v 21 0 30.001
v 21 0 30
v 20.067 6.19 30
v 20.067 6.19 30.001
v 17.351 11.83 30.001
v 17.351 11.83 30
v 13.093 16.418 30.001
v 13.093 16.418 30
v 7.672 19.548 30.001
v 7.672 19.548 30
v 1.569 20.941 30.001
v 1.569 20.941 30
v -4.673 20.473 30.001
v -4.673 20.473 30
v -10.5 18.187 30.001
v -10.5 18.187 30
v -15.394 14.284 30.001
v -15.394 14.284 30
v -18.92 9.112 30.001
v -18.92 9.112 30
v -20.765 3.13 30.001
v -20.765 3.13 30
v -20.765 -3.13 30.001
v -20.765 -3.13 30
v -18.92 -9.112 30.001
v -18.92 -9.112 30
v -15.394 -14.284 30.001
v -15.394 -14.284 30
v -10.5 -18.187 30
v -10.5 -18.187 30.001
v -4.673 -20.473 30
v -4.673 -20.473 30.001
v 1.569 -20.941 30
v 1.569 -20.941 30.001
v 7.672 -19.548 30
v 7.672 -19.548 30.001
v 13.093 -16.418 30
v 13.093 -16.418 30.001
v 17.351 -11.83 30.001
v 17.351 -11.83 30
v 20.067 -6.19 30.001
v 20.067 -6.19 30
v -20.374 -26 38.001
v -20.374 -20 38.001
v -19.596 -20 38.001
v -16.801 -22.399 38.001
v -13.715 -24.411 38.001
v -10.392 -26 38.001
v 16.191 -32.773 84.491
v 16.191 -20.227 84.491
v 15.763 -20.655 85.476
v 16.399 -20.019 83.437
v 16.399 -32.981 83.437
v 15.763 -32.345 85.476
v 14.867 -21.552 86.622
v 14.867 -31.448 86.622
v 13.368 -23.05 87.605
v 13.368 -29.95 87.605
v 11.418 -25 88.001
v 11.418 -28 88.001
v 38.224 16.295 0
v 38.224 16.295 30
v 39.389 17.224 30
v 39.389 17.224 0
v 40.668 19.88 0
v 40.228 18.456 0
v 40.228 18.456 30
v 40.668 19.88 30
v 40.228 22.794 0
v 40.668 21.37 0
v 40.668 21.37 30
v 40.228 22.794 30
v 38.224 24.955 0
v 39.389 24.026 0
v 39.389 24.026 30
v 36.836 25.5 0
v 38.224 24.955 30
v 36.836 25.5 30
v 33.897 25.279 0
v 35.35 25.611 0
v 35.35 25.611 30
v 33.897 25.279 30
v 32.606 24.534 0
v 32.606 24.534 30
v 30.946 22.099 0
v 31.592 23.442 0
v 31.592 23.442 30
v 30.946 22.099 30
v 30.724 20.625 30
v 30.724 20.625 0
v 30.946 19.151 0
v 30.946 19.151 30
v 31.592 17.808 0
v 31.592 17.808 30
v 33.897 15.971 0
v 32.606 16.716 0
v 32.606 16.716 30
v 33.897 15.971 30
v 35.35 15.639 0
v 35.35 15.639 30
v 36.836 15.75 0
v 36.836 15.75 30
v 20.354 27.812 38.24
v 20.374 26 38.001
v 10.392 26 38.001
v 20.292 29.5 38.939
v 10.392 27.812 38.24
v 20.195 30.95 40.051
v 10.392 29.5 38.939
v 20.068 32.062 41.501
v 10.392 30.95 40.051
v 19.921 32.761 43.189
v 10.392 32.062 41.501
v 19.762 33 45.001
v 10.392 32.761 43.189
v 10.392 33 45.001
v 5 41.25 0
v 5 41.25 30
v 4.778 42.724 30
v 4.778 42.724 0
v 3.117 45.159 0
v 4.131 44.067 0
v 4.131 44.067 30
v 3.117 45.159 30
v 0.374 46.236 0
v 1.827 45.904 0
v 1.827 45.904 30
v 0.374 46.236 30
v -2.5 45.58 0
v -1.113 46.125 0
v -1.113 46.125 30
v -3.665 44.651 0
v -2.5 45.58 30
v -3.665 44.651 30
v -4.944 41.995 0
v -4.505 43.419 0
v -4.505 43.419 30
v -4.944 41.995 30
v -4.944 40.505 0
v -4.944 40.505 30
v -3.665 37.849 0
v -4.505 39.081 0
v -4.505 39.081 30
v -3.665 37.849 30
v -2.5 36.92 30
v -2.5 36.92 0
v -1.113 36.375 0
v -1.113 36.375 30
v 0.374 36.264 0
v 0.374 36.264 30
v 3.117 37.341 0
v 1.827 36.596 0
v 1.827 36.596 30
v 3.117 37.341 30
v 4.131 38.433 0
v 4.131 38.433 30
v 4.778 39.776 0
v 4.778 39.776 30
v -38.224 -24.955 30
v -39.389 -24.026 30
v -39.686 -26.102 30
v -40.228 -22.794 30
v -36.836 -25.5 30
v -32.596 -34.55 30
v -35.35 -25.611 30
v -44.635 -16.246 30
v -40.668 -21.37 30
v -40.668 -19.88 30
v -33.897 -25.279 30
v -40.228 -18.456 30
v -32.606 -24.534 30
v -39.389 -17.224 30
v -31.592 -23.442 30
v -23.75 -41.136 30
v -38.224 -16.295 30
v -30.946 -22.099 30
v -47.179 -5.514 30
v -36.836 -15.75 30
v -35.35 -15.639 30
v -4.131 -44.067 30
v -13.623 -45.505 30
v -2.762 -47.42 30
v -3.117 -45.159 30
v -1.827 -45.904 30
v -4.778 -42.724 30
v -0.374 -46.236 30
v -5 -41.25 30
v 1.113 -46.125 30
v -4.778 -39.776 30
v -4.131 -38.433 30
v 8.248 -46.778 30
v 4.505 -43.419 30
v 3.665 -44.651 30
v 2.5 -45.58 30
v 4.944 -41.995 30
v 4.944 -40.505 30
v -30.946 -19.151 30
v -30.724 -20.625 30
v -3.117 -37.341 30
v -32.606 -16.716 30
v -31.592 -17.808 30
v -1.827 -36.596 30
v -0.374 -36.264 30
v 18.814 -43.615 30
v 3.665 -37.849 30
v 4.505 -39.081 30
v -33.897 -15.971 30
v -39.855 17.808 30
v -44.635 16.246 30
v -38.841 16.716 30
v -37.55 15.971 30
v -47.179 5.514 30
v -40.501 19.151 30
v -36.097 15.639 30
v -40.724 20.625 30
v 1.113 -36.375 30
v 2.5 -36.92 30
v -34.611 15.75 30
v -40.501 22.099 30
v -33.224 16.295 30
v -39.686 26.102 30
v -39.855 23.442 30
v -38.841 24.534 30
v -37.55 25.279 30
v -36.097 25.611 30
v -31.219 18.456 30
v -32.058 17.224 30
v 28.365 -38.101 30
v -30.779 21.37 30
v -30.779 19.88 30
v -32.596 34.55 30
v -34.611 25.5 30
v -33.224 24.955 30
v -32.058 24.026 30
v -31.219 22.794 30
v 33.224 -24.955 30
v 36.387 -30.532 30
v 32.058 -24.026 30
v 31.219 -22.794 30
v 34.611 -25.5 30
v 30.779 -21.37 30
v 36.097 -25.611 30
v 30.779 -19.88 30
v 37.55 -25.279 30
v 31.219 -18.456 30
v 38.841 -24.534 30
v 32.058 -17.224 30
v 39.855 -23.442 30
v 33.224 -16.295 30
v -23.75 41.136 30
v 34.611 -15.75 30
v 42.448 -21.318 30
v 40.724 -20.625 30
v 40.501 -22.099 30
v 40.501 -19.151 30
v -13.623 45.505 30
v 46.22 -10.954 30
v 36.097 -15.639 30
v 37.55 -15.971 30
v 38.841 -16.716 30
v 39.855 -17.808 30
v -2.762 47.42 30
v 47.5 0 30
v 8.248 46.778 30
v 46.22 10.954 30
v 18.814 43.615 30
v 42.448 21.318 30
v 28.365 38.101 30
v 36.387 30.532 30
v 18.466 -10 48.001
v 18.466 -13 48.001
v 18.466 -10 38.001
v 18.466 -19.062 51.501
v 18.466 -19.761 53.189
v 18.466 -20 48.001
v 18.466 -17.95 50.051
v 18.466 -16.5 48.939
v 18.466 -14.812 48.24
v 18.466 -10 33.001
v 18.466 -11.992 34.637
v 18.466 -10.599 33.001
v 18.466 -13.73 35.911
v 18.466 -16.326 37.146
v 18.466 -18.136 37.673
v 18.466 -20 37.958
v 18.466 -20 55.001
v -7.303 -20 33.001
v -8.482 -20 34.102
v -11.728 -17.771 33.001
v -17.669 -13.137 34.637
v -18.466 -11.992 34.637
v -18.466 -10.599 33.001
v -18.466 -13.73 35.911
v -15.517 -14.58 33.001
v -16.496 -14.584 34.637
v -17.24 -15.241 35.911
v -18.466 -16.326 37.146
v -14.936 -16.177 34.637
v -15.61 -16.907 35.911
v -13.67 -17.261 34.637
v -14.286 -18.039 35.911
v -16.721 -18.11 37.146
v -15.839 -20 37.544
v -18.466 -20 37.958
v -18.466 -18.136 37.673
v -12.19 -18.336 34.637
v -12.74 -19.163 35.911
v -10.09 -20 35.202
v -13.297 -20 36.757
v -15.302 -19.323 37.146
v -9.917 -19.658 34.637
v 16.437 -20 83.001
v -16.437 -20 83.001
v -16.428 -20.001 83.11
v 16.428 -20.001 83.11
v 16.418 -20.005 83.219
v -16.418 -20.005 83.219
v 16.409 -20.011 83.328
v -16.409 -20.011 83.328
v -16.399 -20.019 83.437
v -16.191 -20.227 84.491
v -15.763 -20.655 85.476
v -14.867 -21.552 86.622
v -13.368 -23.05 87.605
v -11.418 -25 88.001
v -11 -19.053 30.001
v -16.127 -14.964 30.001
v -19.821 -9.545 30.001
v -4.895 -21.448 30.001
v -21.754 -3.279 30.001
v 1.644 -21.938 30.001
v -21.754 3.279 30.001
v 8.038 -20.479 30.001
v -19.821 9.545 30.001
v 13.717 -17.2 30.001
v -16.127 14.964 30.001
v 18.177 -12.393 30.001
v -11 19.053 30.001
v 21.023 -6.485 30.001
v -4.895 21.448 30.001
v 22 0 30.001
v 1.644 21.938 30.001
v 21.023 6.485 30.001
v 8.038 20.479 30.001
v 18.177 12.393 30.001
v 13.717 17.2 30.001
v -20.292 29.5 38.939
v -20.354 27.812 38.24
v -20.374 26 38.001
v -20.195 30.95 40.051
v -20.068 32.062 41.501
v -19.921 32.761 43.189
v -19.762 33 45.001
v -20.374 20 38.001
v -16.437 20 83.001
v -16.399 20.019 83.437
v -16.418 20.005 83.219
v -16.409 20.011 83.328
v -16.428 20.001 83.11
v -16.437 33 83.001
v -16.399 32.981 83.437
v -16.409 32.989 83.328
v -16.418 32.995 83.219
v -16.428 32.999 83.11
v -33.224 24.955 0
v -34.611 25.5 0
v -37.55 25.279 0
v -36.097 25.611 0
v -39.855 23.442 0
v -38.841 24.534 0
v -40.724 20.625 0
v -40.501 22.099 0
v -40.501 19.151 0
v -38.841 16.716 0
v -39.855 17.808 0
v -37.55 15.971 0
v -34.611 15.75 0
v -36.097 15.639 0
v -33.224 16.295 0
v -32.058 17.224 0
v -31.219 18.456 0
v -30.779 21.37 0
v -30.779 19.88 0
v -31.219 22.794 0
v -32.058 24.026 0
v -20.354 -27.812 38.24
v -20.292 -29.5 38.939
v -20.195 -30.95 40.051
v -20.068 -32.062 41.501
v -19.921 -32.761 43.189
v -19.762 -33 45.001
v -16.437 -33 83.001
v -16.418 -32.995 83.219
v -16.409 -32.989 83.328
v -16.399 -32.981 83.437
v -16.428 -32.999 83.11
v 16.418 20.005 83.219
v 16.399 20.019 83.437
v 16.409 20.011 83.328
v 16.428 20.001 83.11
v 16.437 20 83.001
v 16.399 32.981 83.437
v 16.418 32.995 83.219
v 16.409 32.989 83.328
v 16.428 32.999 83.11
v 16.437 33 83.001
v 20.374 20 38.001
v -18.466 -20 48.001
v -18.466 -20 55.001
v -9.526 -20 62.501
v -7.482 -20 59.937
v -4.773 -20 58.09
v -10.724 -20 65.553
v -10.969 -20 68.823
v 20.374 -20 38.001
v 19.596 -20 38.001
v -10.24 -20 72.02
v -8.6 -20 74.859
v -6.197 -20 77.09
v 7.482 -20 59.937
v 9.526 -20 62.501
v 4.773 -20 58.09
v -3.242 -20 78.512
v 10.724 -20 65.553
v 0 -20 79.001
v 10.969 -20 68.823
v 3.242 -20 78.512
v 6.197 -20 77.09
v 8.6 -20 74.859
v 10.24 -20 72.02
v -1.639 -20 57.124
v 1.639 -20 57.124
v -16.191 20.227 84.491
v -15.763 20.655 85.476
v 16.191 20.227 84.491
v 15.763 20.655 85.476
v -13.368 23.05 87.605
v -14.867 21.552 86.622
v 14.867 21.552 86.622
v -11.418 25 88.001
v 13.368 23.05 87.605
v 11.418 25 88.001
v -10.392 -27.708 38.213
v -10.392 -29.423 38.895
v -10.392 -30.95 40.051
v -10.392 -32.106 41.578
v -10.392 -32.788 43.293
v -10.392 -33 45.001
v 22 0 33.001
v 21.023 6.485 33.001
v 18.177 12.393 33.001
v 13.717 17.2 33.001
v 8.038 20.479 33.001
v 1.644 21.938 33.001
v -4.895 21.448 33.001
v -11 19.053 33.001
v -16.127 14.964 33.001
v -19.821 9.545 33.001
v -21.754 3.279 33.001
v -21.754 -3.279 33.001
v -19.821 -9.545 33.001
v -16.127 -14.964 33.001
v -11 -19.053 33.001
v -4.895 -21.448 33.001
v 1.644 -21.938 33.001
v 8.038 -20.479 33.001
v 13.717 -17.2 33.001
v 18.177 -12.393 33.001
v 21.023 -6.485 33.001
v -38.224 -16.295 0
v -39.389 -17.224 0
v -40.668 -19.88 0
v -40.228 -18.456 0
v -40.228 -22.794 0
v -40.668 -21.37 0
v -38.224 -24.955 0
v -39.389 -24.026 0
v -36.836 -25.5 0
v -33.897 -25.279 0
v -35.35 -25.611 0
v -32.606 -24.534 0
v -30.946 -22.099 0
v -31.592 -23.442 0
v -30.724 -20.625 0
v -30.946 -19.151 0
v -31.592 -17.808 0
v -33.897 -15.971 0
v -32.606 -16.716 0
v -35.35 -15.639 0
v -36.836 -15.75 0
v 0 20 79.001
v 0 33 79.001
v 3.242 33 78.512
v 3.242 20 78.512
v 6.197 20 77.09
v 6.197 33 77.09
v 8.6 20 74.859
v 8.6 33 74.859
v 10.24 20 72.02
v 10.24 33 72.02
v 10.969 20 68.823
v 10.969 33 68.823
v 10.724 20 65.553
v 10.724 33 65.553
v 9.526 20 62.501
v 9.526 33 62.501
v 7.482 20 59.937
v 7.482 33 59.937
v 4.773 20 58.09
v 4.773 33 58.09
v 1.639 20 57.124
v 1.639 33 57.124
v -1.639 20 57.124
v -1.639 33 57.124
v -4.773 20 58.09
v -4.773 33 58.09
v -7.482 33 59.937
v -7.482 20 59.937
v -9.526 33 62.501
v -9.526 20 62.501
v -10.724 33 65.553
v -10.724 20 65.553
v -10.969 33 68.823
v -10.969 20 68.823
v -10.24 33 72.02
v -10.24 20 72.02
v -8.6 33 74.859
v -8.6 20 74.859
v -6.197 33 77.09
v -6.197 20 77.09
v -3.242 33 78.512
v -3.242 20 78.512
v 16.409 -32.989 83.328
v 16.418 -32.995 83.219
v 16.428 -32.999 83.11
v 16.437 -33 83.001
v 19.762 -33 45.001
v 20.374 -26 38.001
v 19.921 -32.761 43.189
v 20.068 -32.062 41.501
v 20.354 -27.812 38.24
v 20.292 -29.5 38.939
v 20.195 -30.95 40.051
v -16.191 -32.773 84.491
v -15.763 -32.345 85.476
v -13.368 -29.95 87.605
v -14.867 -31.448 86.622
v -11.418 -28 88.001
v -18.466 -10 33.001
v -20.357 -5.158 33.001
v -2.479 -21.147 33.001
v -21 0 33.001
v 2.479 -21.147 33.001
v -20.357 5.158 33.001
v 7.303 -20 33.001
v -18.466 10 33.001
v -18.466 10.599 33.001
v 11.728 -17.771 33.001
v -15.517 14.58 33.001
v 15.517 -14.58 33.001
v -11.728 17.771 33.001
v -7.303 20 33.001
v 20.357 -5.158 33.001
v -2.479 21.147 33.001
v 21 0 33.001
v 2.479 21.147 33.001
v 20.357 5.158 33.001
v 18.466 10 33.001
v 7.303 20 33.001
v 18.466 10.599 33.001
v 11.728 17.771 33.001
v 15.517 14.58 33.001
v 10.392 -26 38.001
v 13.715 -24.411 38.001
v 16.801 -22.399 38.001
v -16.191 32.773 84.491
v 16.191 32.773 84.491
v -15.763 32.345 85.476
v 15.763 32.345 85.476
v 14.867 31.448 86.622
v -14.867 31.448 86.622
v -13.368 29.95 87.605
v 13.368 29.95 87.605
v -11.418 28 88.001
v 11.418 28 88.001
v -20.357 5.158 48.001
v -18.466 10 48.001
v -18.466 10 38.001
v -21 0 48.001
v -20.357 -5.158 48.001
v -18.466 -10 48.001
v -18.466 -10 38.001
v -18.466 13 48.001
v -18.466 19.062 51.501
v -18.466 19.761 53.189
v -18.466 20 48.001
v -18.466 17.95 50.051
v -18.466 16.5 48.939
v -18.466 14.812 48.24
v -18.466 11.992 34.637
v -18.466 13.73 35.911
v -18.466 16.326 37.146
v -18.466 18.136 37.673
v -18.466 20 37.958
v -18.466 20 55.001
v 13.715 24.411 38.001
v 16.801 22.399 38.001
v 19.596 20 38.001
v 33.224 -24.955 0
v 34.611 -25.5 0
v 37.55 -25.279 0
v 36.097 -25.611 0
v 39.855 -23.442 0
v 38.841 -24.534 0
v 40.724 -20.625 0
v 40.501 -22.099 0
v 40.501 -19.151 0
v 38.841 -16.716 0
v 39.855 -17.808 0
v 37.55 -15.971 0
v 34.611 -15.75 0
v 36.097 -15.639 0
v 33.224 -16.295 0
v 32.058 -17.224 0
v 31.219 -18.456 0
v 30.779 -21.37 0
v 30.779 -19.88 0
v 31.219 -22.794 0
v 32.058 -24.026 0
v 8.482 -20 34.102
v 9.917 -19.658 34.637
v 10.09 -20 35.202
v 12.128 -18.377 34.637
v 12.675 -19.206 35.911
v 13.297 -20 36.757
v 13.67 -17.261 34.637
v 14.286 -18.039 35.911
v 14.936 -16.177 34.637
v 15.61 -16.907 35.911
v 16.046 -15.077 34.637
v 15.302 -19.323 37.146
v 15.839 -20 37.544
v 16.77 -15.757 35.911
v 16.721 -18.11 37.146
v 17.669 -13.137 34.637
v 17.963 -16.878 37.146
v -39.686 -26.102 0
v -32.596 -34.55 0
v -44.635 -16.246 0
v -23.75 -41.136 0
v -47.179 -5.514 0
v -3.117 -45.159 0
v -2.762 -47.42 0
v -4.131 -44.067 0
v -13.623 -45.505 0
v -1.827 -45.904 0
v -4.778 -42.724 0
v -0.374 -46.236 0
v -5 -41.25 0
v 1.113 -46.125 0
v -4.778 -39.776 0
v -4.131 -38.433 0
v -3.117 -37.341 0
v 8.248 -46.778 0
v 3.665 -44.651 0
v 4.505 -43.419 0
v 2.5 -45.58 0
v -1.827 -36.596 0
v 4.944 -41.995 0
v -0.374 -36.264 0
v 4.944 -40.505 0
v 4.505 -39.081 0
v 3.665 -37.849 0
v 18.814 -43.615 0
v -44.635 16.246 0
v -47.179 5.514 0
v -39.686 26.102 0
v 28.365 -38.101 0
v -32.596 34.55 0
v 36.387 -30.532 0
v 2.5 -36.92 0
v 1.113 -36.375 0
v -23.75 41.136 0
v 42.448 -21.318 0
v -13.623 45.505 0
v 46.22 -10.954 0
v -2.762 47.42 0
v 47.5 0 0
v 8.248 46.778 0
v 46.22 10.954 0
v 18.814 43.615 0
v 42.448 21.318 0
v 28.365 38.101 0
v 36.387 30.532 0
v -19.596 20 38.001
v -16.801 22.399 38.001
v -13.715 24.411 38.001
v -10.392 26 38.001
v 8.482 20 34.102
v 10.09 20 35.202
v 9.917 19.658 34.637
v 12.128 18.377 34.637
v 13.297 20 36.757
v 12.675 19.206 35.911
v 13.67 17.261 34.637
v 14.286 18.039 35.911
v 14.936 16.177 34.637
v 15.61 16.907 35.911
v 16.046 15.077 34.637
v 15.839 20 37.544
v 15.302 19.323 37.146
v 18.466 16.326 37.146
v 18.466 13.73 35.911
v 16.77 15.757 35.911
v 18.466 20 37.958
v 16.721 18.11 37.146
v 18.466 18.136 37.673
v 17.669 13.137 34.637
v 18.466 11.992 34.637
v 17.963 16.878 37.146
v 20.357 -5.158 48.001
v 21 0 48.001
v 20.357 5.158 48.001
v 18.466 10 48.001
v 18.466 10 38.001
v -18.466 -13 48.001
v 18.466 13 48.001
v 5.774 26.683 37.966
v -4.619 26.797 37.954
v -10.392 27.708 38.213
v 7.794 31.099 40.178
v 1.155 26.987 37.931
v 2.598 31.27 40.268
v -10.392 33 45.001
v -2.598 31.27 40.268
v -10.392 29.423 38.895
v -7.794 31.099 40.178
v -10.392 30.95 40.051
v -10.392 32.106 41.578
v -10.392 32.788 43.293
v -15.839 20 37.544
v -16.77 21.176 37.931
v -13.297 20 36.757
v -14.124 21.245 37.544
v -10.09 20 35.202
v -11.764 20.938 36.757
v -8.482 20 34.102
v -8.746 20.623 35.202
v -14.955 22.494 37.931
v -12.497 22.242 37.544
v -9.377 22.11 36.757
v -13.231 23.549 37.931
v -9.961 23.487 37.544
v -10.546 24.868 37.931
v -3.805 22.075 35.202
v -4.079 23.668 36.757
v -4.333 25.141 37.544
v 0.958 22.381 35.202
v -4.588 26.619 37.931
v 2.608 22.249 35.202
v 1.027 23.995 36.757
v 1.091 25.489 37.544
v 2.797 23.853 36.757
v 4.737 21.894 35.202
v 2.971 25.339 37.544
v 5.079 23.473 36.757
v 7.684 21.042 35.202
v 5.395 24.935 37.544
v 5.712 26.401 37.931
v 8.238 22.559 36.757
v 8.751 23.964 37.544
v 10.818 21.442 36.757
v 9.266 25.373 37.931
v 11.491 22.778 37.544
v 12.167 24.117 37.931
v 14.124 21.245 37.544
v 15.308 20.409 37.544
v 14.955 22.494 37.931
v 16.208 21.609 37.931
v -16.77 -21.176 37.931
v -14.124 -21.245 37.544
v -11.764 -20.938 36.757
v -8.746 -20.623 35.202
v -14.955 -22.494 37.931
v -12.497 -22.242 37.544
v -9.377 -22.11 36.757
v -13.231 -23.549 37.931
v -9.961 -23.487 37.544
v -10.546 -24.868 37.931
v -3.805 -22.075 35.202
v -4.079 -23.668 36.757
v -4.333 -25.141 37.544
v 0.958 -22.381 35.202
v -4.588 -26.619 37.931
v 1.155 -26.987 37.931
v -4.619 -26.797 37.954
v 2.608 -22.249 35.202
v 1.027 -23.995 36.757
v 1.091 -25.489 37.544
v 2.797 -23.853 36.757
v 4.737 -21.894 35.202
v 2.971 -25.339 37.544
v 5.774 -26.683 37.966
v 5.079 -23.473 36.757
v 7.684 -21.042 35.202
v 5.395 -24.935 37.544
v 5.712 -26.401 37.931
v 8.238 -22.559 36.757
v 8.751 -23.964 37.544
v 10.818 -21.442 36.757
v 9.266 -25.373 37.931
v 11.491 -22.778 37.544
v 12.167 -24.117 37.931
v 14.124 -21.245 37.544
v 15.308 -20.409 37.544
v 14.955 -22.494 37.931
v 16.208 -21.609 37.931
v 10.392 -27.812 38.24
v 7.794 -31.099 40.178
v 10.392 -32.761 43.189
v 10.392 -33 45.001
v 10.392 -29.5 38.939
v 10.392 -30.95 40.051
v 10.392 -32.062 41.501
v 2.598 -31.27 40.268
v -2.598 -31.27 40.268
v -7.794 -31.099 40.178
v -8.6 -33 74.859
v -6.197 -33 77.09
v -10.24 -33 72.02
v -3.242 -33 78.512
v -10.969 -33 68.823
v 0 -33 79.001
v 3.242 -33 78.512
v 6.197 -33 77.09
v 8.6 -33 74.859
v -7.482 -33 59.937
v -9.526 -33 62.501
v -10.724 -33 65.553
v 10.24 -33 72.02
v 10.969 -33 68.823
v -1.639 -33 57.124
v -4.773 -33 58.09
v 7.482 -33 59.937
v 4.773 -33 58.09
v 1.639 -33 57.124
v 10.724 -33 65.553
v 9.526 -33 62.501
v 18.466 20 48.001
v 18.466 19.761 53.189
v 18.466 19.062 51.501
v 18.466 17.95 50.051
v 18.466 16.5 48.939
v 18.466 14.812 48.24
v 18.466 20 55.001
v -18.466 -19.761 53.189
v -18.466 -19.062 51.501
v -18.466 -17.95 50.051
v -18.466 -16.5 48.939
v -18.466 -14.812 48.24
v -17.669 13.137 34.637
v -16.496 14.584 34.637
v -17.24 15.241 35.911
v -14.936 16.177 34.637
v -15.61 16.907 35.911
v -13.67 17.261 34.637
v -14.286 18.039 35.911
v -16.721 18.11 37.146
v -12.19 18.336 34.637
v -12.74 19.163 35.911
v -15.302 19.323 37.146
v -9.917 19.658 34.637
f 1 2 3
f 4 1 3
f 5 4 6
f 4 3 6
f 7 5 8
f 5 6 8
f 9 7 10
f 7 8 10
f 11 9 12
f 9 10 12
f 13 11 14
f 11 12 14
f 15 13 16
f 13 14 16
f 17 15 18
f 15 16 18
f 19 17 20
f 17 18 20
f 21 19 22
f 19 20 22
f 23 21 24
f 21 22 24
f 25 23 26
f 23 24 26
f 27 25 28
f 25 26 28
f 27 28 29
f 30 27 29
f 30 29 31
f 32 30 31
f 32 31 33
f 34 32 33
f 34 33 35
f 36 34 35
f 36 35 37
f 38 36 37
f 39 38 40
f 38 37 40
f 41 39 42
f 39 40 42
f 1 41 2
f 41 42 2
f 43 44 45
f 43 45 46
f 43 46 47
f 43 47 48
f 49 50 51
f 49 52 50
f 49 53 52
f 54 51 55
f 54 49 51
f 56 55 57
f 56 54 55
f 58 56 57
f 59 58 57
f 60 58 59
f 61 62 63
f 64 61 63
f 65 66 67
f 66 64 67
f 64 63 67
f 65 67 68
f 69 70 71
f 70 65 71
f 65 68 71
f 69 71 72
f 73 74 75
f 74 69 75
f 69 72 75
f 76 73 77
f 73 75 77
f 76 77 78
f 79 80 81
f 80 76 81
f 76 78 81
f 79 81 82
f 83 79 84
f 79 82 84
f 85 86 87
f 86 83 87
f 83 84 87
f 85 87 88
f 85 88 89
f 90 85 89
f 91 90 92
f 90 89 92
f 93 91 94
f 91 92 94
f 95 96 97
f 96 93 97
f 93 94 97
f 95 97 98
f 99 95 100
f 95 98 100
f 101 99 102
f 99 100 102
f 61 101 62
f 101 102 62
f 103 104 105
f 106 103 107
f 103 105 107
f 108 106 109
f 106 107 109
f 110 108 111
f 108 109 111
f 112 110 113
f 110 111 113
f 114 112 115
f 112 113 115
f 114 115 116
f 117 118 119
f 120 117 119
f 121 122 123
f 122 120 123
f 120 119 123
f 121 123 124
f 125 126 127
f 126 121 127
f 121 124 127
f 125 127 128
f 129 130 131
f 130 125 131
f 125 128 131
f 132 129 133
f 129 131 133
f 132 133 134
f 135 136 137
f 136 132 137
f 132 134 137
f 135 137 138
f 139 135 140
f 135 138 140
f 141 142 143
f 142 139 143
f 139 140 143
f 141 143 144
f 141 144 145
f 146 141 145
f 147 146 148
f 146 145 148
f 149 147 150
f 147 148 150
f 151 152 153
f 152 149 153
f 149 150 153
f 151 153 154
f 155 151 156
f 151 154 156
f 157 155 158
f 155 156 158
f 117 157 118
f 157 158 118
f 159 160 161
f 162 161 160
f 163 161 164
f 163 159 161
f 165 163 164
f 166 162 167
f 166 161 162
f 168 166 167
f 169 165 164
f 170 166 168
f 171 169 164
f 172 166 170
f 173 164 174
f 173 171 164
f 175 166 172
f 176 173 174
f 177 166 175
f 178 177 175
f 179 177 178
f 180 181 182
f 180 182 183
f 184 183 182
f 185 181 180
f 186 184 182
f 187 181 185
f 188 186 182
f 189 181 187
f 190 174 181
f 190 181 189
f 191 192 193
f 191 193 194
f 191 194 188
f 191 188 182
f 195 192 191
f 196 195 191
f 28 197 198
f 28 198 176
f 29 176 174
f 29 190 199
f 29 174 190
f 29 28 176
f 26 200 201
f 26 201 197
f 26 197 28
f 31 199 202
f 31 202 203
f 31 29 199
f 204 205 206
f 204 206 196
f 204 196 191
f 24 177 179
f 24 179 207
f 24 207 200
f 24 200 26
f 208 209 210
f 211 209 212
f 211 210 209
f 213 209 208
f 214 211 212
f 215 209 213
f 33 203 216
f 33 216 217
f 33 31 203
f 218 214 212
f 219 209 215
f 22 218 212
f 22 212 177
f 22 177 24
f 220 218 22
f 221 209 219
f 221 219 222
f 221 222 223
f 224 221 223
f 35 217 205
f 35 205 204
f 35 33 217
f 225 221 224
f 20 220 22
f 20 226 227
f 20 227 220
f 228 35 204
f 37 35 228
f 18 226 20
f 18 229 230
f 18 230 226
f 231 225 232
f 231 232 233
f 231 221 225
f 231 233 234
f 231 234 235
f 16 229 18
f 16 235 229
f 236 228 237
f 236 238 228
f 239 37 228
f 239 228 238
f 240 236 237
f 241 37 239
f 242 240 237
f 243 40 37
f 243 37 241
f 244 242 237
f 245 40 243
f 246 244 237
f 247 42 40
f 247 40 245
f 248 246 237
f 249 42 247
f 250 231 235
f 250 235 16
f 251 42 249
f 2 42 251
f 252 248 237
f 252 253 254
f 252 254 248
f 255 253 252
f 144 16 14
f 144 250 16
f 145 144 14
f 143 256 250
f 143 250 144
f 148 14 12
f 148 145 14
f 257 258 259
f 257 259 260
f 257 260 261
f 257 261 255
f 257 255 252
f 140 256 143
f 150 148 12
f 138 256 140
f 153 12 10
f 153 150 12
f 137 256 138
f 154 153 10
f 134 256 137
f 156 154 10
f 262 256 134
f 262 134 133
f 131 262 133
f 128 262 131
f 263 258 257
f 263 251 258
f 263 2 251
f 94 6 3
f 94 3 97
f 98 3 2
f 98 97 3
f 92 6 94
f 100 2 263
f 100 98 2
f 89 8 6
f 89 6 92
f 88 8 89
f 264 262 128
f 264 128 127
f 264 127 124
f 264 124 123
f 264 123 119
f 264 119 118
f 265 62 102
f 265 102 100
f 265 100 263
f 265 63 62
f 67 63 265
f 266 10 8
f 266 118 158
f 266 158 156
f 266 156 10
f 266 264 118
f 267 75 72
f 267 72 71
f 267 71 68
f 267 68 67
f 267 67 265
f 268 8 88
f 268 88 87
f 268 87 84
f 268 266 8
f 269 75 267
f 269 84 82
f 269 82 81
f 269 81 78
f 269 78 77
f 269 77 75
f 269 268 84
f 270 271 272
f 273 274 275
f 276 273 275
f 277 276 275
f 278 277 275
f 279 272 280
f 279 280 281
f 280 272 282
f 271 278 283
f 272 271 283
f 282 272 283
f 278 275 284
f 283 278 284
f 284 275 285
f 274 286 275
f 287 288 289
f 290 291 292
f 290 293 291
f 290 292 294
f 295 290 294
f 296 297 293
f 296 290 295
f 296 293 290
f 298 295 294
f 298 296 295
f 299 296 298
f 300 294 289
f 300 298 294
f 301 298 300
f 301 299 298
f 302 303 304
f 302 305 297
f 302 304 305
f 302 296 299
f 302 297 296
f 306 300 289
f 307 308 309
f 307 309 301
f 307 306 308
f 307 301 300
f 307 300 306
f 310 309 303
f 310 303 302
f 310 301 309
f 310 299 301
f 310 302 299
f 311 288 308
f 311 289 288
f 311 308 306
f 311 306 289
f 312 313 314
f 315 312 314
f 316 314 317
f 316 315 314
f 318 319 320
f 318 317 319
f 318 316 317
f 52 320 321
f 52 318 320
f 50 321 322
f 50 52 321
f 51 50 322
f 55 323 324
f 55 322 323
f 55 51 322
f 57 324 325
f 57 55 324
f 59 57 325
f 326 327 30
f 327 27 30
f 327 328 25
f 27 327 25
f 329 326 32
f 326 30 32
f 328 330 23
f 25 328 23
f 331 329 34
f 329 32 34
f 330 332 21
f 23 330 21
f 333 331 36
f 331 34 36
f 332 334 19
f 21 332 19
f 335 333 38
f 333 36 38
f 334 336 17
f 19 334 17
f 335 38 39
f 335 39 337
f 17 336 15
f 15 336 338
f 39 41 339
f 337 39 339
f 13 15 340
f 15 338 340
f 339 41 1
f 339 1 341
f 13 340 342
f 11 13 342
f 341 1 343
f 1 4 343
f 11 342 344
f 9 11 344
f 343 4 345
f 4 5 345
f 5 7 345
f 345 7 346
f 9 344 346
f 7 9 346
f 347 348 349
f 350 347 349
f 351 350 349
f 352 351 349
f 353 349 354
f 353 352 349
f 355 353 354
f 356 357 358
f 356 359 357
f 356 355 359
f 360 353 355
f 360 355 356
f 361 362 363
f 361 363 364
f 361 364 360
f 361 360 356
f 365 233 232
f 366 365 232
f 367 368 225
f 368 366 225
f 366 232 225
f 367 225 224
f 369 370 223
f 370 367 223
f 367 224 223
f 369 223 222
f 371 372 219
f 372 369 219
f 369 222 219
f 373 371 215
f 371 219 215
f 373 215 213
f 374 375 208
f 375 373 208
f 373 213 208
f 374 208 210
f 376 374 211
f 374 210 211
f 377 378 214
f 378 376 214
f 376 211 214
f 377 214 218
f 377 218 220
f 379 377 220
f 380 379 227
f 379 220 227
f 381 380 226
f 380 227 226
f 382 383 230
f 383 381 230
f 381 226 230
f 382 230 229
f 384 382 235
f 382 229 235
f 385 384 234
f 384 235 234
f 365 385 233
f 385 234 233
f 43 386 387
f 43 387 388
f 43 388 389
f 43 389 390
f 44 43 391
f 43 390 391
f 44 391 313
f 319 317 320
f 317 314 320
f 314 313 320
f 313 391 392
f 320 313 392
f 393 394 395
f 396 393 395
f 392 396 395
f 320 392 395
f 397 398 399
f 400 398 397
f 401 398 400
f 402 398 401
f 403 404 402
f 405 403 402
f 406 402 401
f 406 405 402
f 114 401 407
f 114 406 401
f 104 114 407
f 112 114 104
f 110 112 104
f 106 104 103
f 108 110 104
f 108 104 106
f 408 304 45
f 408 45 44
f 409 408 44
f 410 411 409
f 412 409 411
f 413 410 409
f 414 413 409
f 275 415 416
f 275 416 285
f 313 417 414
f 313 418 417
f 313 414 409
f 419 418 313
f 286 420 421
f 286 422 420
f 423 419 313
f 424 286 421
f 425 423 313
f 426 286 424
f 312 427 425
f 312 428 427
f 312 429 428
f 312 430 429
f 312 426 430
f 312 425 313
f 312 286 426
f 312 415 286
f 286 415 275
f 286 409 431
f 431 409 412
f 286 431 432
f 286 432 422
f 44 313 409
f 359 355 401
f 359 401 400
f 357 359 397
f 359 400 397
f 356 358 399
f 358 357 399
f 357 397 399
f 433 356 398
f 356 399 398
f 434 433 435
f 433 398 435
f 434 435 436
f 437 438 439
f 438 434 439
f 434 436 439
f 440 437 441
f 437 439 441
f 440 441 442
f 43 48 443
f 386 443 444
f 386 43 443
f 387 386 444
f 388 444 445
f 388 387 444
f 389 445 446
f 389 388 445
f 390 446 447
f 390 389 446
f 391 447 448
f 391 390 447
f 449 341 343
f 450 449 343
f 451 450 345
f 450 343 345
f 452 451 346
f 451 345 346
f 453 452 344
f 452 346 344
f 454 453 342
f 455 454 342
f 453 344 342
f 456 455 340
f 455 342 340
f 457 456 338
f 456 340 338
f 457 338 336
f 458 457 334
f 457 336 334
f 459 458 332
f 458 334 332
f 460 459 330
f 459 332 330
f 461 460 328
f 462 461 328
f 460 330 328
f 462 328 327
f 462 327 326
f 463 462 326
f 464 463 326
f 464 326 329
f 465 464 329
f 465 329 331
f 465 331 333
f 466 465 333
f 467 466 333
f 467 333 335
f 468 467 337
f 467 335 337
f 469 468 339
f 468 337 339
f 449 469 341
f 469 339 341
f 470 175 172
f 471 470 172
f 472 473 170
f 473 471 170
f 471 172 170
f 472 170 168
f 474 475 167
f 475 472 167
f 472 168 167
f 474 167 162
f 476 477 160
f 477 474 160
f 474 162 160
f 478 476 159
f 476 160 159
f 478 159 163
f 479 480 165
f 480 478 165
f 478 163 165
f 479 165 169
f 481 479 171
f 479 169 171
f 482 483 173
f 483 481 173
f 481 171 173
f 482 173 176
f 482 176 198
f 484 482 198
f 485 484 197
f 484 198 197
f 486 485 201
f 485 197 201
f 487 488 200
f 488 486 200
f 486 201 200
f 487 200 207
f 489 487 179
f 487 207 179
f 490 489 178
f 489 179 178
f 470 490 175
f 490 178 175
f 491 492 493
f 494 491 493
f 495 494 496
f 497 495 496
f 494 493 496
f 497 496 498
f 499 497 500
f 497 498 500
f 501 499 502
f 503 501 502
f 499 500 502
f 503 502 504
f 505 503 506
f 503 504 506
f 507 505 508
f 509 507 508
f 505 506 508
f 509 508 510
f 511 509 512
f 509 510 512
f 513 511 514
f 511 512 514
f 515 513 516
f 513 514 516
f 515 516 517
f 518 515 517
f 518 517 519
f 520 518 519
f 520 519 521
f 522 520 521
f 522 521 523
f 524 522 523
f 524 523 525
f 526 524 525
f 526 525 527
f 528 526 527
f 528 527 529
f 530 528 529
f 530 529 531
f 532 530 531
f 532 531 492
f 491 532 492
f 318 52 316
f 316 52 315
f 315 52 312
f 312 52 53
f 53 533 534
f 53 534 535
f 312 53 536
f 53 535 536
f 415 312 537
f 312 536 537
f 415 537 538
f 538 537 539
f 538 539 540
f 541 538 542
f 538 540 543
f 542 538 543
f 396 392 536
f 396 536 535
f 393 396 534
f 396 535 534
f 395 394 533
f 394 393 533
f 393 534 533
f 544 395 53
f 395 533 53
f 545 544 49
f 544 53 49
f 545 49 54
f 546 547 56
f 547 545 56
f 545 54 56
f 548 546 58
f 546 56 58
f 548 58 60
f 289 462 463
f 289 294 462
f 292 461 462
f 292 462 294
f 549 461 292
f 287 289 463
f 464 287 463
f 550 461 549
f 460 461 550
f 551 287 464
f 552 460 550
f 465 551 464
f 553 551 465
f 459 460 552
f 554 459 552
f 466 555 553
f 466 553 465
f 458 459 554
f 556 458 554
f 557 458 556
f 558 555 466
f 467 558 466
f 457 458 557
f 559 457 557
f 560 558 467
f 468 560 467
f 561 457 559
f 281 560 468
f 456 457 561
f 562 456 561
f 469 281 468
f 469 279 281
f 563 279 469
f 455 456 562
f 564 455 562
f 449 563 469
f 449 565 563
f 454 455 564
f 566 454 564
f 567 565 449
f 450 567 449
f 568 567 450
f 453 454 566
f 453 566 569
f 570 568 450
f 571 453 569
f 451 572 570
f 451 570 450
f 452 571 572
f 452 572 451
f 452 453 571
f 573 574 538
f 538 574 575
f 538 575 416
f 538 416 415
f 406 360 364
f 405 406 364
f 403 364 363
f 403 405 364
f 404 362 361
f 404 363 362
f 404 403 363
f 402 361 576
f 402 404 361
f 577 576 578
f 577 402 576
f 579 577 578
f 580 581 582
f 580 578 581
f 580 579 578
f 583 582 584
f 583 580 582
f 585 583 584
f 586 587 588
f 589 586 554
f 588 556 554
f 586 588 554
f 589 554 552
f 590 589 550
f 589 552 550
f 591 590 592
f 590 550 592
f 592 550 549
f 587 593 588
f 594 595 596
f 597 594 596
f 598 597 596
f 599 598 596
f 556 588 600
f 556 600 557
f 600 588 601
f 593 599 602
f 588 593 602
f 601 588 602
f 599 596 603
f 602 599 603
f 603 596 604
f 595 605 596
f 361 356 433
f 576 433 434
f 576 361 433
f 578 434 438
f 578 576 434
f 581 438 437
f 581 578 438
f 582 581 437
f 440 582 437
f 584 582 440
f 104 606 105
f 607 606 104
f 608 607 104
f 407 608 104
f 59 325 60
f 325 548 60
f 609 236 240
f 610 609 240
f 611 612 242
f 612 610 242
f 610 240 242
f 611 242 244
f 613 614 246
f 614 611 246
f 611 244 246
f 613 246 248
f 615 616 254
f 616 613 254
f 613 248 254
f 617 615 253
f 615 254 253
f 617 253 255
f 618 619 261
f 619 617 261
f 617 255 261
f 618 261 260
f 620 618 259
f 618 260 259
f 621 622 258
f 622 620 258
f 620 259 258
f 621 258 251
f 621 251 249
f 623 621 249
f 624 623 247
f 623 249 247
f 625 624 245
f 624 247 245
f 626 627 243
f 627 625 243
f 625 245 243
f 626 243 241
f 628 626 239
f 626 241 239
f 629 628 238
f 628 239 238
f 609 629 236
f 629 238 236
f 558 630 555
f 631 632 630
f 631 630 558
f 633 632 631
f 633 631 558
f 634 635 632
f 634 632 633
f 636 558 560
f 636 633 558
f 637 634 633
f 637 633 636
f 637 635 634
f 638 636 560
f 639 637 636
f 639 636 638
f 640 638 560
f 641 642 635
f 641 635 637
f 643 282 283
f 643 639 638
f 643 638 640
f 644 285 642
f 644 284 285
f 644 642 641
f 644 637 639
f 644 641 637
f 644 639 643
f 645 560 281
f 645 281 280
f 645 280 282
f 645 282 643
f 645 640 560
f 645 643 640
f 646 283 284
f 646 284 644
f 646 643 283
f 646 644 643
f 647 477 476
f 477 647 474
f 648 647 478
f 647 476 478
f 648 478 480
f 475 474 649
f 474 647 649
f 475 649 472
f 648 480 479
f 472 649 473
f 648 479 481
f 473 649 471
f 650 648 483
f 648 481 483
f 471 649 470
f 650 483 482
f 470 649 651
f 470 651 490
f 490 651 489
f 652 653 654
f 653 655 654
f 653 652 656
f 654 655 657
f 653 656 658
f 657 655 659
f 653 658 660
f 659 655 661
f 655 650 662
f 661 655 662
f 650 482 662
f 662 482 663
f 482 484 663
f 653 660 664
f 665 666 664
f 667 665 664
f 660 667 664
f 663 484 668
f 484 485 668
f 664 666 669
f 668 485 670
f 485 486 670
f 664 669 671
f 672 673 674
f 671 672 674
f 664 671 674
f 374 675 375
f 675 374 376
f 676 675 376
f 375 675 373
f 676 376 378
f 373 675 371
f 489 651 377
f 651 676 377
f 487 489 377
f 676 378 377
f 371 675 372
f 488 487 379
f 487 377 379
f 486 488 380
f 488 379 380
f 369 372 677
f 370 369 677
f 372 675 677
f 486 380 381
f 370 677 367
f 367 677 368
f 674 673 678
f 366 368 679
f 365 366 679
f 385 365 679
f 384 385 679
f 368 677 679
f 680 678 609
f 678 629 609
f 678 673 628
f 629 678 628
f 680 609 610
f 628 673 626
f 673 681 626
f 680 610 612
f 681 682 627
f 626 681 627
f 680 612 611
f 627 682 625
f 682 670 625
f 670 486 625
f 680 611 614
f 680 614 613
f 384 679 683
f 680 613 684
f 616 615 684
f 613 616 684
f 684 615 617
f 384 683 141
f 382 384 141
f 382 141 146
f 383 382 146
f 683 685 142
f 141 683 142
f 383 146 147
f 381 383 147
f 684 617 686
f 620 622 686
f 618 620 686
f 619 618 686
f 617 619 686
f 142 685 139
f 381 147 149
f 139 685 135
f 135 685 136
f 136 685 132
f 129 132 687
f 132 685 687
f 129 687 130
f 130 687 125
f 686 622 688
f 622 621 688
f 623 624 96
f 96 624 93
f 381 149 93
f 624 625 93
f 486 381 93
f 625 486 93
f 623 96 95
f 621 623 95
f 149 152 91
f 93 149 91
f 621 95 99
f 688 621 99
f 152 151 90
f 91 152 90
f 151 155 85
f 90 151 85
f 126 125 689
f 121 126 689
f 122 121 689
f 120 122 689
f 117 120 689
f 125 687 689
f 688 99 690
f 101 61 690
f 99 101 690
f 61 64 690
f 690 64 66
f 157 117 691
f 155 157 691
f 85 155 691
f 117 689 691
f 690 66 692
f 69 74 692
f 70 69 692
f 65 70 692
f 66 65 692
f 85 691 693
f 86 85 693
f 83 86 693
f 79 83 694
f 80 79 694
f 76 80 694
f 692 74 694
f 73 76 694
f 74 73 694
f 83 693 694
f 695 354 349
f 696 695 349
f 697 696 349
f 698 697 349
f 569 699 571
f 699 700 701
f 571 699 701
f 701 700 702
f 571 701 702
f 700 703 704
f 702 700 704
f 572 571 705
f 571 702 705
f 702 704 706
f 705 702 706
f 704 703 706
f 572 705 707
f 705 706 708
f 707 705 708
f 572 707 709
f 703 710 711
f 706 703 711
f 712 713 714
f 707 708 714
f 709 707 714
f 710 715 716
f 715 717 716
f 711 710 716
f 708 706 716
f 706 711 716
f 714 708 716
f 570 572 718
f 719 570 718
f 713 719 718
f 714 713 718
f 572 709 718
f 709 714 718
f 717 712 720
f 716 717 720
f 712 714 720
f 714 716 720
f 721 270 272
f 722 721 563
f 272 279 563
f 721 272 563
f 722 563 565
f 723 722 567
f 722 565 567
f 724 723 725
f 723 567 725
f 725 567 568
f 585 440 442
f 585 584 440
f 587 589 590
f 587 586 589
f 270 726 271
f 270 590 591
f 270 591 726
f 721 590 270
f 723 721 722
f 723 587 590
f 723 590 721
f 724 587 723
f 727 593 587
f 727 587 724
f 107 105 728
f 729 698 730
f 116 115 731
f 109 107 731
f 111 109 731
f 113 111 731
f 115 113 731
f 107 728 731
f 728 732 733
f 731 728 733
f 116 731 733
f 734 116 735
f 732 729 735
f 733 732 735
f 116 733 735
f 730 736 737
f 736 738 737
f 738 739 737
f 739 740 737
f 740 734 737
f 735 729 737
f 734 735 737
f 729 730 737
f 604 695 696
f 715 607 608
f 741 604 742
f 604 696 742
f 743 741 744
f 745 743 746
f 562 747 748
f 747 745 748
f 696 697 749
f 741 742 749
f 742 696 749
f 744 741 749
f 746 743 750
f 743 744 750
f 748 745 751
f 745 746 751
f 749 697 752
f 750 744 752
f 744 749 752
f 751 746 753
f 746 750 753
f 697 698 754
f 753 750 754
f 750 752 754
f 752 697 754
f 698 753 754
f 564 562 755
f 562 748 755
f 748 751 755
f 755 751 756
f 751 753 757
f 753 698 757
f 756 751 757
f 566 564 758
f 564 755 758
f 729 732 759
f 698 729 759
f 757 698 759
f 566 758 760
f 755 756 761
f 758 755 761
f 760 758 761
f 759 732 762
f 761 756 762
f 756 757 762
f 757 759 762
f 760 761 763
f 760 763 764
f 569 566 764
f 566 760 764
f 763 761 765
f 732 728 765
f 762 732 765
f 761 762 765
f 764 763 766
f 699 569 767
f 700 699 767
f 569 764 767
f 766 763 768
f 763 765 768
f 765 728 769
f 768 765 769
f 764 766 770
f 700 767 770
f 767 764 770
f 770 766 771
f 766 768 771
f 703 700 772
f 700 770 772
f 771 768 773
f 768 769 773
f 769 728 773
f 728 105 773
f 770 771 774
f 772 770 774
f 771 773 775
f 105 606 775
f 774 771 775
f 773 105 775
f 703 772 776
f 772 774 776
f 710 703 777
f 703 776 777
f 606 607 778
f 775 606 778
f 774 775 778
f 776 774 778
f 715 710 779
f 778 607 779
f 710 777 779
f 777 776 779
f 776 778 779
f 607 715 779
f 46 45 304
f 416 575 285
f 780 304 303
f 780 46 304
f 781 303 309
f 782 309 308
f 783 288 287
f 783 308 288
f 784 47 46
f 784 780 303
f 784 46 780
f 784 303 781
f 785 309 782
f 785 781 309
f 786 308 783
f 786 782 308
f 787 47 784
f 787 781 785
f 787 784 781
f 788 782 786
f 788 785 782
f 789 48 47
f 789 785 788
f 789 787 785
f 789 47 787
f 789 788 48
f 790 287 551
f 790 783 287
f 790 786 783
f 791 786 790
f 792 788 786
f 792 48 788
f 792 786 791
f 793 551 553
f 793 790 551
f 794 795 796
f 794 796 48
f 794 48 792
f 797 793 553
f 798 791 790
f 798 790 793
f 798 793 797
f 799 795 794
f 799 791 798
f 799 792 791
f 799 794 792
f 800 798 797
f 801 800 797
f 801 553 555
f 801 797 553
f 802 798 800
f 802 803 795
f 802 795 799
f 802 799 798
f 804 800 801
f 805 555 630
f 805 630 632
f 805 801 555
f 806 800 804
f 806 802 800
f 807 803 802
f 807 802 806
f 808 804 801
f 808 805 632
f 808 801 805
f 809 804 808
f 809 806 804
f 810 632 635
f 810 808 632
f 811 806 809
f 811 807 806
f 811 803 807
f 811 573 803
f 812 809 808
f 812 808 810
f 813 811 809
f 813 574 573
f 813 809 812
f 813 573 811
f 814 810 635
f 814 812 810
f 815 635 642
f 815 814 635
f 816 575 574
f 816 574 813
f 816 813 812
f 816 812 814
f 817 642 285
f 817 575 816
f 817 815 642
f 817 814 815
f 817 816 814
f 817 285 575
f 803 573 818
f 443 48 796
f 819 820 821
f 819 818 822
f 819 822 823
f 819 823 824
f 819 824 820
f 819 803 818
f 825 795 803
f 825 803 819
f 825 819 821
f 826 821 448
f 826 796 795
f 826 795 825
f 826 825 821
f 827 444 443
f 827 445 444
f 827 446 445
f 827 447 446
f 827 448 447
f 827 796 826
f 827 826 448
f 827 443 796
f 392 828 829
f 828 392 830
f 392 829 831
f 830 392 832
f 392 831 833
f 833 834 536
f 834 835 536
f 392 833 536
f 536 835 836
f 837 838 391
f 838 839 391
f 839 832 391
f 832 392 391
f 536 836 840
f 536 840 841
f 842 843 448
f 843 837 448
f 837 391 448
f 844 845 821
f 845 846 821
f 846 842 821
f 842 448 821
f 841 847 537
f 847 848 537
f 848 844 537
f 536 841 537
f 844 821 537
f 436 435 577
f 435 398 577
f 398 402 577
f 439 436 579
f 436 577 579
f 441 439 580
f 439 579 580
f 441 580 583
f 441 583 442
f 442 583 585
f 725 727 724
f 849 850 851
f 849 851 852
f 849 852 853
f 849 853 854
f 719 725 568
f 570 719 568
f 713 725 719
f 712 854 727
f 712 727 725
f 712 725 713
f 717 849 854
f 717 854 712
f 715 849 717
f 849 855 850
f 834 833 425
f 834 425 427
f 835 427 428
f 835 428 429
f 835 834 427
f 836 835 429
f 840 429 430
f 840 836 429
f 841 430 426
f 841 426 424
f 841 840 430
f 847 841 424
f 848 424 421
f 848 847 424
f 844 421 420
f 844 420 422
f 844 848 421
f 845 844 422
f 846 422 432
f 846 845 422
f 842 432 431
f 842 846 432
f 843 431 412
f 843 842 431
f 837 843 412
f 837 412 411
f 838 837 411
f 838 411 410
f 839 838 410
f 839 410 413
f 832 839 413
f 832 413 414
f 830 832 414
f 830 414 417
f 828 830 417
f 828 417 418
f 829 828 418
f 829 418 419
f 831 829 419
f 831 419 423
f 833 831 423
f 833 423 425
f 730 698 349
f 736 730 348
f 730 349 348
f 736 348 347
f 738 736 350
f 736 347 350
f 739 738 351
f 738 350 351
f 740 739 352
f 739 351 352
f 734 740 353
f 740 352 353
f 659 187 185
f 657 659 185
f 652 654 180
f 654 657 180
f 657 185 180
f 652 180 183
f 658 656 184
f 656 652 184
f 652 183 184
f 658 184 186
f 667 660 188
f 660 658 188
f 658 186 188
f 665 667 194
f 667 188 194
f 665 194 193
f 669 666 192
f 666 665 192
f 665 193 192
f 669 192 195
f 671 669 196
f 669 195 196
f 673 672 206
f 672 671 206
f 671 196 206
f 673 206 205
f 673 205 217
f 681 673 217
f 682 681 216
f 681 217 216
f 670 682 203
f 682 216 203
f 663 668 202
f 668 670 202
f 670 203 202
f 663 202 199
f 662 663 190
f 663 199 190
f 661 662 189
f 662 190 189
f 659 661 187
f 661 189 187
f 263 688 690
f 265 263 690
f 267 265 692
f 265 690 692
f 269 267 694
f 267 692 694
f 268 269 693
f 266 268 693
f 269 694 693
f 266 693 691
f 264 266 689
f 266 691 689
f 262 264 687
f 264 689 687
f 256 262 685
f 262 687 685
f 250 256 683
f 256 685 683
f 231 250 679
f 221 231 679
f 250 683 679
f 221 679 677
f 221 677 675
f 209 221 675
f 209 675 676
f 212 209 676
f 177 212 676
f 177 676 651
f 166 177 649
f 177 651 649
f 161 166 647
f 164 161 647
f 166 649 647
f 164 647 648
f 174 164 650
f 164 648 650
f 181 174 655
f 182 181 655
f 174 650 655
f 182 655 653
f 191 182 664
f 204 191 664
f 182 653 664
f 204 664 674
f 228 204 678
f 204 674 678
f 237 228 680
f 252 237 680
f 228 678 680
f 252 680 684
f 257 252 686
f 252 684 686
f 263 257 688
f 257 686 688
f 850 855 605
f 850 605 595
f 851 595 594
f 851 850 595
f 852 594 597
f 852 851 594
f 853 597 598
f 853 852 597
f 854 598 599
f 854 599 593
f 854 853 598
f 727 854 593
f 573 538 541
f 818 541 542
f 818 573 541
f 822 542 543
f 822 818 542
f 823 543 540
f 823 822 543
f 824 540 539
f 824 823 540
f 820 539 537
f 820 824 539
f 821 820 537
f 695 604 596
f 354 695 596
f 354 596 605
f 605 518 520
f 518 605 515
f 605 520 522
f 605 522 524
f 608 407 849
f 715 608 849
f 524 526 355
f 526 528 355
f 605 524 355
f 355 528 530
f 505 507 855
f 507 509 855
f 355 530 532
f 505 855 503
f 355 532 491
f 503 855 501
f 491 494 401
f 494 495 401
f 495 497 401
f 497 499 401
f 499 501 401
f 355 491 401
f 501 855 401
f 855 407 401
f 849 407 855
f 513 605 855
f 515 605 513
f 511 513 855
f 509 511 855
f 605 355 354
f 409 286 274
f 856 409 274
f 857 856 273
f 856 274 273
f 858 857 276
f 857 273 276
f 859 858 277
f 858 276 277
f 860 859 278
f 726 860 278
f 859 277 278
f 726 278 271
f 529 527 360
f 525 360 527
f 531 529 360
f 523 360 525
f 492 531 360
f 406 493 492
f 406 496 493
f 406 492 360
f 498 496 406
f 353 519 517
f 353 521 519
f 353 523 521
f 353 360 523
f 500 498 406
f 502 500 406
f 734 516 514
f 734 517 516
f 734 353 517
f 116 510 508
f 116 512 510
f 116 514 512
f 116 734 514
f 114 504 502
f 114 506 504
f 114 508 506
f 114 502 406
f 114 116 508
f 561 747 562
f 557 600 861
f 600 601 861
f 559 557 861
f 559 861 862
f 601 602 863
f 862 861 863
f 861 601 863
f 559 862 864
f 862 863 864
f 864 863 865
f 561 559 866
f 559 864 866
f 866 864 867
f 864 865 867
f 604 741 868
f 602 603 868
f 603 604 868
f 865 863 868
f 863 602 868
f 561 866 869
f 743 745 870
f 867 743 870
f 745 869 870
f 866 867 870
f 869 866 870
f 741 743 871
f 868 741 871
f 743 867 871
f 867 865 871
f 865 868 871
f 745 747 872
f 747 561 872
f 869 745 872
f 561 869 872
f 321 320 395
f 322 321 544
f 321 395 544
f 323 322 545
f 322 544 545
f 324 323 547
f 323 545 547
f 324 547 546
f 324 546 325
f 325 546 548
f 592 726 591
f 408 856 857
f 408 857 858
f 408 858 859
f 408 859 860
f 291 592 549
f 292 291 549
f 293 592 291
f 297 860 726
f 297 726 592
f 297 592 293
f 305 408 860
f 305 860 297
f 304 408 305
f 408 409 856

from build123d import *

# Parameters (mm, degrees)
SZKIC1_R                    = 47.5
DODANIE_WYCI_GNI_CIE1_DEPTH = 30
WYTNIJ_WYCI_GNI_CIE1_REACH  = 75.57
SZKIC2_R                    = 5
SZYK_KO_OWY1_COUNT          = 6
SZKIC3_R                    = 21
DODANIE_WYCI_GNI_CIE2_DEPTH = 0.001
SZKIC5_R                    = 22
DODANIE_WYCI_GNI_CIE4_DEPTH = 3
SZKIC7_R                    = 21
DODANIE_WYCI_GNI_CIE5_DEPTH = 15
DODANIE_WYCI_GNI_CIE6_DEPTH = 6.5
SZKIC14_W                   = 36.932370626
SZKIC14_H                   = 10
DODANIE_WYCI_GNI_CIE7_DEPTH = 10
ZAOKR_GLENIE1_R             = 7
ZAOKR_GLENIE2_R             = 7
ZAOKR_GLENIE3_R             = 5
WYTNIJ_WYCI_GNI_CIE2_REACH  = 130.377
SZKIC16_R                   = 11


# Read off the part's stored shape, not the designer's step: Lustro1
with BuildPart() as part:
    # Szkic1 → Dodanie-wyciągnięcie1 (new body)
    with BuildSketch(Plane.XY):
        Circle(SZKIC1_R)
    extrude(amount=DODANIE_WYCI_GNI_CIE1_DEPTH)

    # Szkic2 → Wytnij-wyciągnięcie1 (cut, up to next)
    with BuildSketch(Plane.XY.offset(30), mode=Mode.PRIVATE) as wytnij_wyci_gni_cie1_sk1:
        with Locations((0, 41.25)):
            Circle(SZKIC2_R)
    wytnij_wyci_gni_cie1_tool1 = extrude(wytnij_wyci_gni_cie1_sk1.sketch, amount=-WYTNIJ_WYCI_GNI_CIE1_REACH, mode=Mode.PRIVATE) & part.part
    wytnij_wyci_gni_cie1 = wytnij_wyci_gni_cie1_tool1.solids().sort_by_distance((0, 41.25, 30))[0]
    add(wytnij_wyci_gni_cie1, mode=Mode.SUBTRACT)

    # Szyk kołowy1: Wytnij-wyciągnięcie1 ×6 about axis
    szyk_ko_owy1_axis = Axis((0, 0, 0), (0, 0, 1))
    for i in range(1, SZYK_KO_OWY1_COUNT):
        add(wytnij_wyci_gni_cie1.rotate(szyk_ko_owy1_axis, i * 360 / SZYK_KO_OWY1_COUNT), mode=Mode.SUBTRACT)

    # Szkic3 → Dodanie-wyciągnięcie2 (add)
    with BuildSketch(Plane.XY.offset(30)):
        Circle(SZKIC3_R)
    extrude(amount=DODANIE_WYCI_GNI_CIE2_DEPTH)

    # Szkic5 → Dodanie-wyciągnięcie4 (add)
    with BuildSketch(Plane.XY.offset(30.001)):
        Circle(SZKIC5_R)
    extrude(amount=DODANIE_WYCI_GNI_CIE4_DEPTH)

    # Szkic7 → Dodanie-wyciągnięcie5 (add)
    with BuildSketch(Plane.XY.offset(33.001)):
        Circle(SZKIC7_R)
    extrude(amount=DODANIE_WYCI_GNI_CIE5_DEPTH)

    # Szkic9 → Dodanie-wyciągnięcie6 (add, symmetric)
    with BuildSketch(Plane(origin=(0, 26.5, 0), x_dir=(1, 0, 0), z_dir=(0, 1, 0))):
        Polygon((-20.374433176, -38.001), (-16, -88.001), (16, -88.001), (20.374433176, -38.001), align=None)
    extrude(amount=DODANIE_WYCI_GNI_CIE6_DEPTH, both=True)

    # Szkic14 → Dodanie-wyciągnięcie7 (add)
    with BuildSketch(Plane(origin=(0, 10, 0), x_dir=(1, 0, 0), z_dir=(0, 1, 0))):
        with Locations((0, -43.001)):
            Rectangle(SZKIC14_W, SZKIC14_H)
    extrude(amount=DODANIE_WYCI_GNI_CIE7_DEPTH)

    # Zaokrąglenie1
    # the kernel refuses this fillet: 7 mm, written as the material it adds along each edge
    with BuildSketch(Plane(origin=(0, 0, 38.001), x_dir=(-0.9435381877974668, -0.33126377430662785, 0), z_dir=(0.33126377430662785, -0.9435381877974668, 0))) as zaokr_glenie1_piece_1_section:
        with BuildLine():
            CenterArc((21 + ZAOKR_GLENIE1_R, ZAOKR_GLENIE1_R), ZAOKR_GLENIE1_R, 180, 90)
            Line((21 + ZAOKR_GLENIE1_R, 0), (21, 0))
            Line((21, 0), (21, ZAOKR_GLENIE1_R))
        make_face()
    zaokr_glenie1_piece_1 = revolve(axis=Axis((0, 0, 38.001), (0, 0, -1)), revolution_arc=218.690998802, mode=Mode.PRIVATE)
    zaokr_glenie1_piece_1 = split(zaokr_glenie1_piece_1, bisect_by=Plane(origin=(-18.694483681, 20, 37.992305912), z_dir=(0, 1, 0)), keep=Keep.TOP, mode=Mode.PRIVATE)
    add(zaokr_glenie1_piece_1)
    with BuildSketch(Plane(origin=(0, 0, 38.001), x_dir=(-0.9435381877974668, -0.33126377430662785, 0), z_dir=(0.33126377430662785, -0.9435381877974668, 0))) as zaokr_glenie1_piece_2_section:
        with BuildLine():
            CenterArc((21 + ZAOKR_GLENIE1_R, ZAOKR_GLENIE1_R), ZAOKR_GLENIE1_R, 180, 90)
            Line((21 + ZAOKR_GLENIE1_R, 0), (21, 0))
            Line((21, 0), (21, ZAOKR_GLENIE1_R))
        make_face()
    zaokr_glenie1_piece_2 = revolve(axis=Axis((0, 0, 38.001), (0, 0, -1)), revolution_arc=218.690998802, mode=Mode.PRIVATE)
    zaokr_glenie1_piece_2 = split(zaokr_glenie1_piece_2, bisect_by=Plane(origin=(-18.466185313, 16.543060956, 36.276393693), z_dir=(1, 0, 0)), keep=Keep.TOP, mode=Mode.PRIVATE)
    zaokr_glenie1_piece_2 = split(zaokr_glenie1_piece_2, bisect_by=Plane(origin=(18.466185313, 16.543060956, 36.276393693), z_dir=(-1, 0, 0)), keep=Keep.TOP, mode=Mode.PRIVATE)
    add(zaokr_glenie1_piece_2)
    with BuildSketch(Plane(origin=(18.466185313, 20, 48.001), x_dir=(0, 0, 1), z_dir=(-1, 0, 0))) as zaokr_glenie1_piece_3:
        with BuildLine():
            CenterArc((ZAOKR_GLENIE1_R, -ZAOKR_GLENIE1_R), ZAOKR_GLENIE1_R, 90, 90)
            Line((0, -ZAOKR_GLENIE1_R), (0, 0))
            Line((0, 0), (ZAOKR_GLENIE1_R, 0))
        make_face()
    extrude(amount=36.932370625)

    # Zaokrąglenie2
    zaokr_glenie2_edges = [part.edges().sort_by_distance(p)[0] for p in [
        (0, 33, 38.001),
    ]]
    fillet(zaokr_glenie2_edges, radius=ZAOKR_GLENIE2_R)

    # Zaokrąglenie3
    zaokr_glenie3_edges = [part.edges().sort_by_distance(p)[0] for p in [
        (0, 20, 88.001),
        (-16, 26.5, 88.001),
        (16, 26.5, 88.001),
        (0, 33, 88.001),
    ]]
    fillet(zaokr_glenie3_edges, radius=ZAOKR_GLENIE3_R)

    # Szkic16 → Wytnij-wyciągnięcie2 (cut, up to next)
    with BuildSketch(Plane(origin=(0, 33, 0), x_dir=(1, 0, 0), z_dir=(0, 1, 0)), mode=Mode.PRIVATE) as wytnij_wyci_gni_cie2_sk1:
        with Locations(Location((0, -68.001, 0), (0, 0, 270))):
            Circle(SZKIC16_R)
    wytnij_wyci_gni_cie2_tool1 = extrude(wytnij_wyci_gni_cie2_sk1.sketch, amount=-WYTNIJ_WYCI_GNI_CIE2_REACH, mode=Mode.PRIVATE) & part.part
    add(wytnij_wyci_gni_cie2_tool1.solids().sort_by_distance((0, 33, 68.001))[0], mode=Mode.SUBTRACT)

    # Lustro1: part across plane


with BuildPart() as part_1:
    add(part.part)
    add(part.part.mirror(Plane.ZX))


solid = part_1.part
